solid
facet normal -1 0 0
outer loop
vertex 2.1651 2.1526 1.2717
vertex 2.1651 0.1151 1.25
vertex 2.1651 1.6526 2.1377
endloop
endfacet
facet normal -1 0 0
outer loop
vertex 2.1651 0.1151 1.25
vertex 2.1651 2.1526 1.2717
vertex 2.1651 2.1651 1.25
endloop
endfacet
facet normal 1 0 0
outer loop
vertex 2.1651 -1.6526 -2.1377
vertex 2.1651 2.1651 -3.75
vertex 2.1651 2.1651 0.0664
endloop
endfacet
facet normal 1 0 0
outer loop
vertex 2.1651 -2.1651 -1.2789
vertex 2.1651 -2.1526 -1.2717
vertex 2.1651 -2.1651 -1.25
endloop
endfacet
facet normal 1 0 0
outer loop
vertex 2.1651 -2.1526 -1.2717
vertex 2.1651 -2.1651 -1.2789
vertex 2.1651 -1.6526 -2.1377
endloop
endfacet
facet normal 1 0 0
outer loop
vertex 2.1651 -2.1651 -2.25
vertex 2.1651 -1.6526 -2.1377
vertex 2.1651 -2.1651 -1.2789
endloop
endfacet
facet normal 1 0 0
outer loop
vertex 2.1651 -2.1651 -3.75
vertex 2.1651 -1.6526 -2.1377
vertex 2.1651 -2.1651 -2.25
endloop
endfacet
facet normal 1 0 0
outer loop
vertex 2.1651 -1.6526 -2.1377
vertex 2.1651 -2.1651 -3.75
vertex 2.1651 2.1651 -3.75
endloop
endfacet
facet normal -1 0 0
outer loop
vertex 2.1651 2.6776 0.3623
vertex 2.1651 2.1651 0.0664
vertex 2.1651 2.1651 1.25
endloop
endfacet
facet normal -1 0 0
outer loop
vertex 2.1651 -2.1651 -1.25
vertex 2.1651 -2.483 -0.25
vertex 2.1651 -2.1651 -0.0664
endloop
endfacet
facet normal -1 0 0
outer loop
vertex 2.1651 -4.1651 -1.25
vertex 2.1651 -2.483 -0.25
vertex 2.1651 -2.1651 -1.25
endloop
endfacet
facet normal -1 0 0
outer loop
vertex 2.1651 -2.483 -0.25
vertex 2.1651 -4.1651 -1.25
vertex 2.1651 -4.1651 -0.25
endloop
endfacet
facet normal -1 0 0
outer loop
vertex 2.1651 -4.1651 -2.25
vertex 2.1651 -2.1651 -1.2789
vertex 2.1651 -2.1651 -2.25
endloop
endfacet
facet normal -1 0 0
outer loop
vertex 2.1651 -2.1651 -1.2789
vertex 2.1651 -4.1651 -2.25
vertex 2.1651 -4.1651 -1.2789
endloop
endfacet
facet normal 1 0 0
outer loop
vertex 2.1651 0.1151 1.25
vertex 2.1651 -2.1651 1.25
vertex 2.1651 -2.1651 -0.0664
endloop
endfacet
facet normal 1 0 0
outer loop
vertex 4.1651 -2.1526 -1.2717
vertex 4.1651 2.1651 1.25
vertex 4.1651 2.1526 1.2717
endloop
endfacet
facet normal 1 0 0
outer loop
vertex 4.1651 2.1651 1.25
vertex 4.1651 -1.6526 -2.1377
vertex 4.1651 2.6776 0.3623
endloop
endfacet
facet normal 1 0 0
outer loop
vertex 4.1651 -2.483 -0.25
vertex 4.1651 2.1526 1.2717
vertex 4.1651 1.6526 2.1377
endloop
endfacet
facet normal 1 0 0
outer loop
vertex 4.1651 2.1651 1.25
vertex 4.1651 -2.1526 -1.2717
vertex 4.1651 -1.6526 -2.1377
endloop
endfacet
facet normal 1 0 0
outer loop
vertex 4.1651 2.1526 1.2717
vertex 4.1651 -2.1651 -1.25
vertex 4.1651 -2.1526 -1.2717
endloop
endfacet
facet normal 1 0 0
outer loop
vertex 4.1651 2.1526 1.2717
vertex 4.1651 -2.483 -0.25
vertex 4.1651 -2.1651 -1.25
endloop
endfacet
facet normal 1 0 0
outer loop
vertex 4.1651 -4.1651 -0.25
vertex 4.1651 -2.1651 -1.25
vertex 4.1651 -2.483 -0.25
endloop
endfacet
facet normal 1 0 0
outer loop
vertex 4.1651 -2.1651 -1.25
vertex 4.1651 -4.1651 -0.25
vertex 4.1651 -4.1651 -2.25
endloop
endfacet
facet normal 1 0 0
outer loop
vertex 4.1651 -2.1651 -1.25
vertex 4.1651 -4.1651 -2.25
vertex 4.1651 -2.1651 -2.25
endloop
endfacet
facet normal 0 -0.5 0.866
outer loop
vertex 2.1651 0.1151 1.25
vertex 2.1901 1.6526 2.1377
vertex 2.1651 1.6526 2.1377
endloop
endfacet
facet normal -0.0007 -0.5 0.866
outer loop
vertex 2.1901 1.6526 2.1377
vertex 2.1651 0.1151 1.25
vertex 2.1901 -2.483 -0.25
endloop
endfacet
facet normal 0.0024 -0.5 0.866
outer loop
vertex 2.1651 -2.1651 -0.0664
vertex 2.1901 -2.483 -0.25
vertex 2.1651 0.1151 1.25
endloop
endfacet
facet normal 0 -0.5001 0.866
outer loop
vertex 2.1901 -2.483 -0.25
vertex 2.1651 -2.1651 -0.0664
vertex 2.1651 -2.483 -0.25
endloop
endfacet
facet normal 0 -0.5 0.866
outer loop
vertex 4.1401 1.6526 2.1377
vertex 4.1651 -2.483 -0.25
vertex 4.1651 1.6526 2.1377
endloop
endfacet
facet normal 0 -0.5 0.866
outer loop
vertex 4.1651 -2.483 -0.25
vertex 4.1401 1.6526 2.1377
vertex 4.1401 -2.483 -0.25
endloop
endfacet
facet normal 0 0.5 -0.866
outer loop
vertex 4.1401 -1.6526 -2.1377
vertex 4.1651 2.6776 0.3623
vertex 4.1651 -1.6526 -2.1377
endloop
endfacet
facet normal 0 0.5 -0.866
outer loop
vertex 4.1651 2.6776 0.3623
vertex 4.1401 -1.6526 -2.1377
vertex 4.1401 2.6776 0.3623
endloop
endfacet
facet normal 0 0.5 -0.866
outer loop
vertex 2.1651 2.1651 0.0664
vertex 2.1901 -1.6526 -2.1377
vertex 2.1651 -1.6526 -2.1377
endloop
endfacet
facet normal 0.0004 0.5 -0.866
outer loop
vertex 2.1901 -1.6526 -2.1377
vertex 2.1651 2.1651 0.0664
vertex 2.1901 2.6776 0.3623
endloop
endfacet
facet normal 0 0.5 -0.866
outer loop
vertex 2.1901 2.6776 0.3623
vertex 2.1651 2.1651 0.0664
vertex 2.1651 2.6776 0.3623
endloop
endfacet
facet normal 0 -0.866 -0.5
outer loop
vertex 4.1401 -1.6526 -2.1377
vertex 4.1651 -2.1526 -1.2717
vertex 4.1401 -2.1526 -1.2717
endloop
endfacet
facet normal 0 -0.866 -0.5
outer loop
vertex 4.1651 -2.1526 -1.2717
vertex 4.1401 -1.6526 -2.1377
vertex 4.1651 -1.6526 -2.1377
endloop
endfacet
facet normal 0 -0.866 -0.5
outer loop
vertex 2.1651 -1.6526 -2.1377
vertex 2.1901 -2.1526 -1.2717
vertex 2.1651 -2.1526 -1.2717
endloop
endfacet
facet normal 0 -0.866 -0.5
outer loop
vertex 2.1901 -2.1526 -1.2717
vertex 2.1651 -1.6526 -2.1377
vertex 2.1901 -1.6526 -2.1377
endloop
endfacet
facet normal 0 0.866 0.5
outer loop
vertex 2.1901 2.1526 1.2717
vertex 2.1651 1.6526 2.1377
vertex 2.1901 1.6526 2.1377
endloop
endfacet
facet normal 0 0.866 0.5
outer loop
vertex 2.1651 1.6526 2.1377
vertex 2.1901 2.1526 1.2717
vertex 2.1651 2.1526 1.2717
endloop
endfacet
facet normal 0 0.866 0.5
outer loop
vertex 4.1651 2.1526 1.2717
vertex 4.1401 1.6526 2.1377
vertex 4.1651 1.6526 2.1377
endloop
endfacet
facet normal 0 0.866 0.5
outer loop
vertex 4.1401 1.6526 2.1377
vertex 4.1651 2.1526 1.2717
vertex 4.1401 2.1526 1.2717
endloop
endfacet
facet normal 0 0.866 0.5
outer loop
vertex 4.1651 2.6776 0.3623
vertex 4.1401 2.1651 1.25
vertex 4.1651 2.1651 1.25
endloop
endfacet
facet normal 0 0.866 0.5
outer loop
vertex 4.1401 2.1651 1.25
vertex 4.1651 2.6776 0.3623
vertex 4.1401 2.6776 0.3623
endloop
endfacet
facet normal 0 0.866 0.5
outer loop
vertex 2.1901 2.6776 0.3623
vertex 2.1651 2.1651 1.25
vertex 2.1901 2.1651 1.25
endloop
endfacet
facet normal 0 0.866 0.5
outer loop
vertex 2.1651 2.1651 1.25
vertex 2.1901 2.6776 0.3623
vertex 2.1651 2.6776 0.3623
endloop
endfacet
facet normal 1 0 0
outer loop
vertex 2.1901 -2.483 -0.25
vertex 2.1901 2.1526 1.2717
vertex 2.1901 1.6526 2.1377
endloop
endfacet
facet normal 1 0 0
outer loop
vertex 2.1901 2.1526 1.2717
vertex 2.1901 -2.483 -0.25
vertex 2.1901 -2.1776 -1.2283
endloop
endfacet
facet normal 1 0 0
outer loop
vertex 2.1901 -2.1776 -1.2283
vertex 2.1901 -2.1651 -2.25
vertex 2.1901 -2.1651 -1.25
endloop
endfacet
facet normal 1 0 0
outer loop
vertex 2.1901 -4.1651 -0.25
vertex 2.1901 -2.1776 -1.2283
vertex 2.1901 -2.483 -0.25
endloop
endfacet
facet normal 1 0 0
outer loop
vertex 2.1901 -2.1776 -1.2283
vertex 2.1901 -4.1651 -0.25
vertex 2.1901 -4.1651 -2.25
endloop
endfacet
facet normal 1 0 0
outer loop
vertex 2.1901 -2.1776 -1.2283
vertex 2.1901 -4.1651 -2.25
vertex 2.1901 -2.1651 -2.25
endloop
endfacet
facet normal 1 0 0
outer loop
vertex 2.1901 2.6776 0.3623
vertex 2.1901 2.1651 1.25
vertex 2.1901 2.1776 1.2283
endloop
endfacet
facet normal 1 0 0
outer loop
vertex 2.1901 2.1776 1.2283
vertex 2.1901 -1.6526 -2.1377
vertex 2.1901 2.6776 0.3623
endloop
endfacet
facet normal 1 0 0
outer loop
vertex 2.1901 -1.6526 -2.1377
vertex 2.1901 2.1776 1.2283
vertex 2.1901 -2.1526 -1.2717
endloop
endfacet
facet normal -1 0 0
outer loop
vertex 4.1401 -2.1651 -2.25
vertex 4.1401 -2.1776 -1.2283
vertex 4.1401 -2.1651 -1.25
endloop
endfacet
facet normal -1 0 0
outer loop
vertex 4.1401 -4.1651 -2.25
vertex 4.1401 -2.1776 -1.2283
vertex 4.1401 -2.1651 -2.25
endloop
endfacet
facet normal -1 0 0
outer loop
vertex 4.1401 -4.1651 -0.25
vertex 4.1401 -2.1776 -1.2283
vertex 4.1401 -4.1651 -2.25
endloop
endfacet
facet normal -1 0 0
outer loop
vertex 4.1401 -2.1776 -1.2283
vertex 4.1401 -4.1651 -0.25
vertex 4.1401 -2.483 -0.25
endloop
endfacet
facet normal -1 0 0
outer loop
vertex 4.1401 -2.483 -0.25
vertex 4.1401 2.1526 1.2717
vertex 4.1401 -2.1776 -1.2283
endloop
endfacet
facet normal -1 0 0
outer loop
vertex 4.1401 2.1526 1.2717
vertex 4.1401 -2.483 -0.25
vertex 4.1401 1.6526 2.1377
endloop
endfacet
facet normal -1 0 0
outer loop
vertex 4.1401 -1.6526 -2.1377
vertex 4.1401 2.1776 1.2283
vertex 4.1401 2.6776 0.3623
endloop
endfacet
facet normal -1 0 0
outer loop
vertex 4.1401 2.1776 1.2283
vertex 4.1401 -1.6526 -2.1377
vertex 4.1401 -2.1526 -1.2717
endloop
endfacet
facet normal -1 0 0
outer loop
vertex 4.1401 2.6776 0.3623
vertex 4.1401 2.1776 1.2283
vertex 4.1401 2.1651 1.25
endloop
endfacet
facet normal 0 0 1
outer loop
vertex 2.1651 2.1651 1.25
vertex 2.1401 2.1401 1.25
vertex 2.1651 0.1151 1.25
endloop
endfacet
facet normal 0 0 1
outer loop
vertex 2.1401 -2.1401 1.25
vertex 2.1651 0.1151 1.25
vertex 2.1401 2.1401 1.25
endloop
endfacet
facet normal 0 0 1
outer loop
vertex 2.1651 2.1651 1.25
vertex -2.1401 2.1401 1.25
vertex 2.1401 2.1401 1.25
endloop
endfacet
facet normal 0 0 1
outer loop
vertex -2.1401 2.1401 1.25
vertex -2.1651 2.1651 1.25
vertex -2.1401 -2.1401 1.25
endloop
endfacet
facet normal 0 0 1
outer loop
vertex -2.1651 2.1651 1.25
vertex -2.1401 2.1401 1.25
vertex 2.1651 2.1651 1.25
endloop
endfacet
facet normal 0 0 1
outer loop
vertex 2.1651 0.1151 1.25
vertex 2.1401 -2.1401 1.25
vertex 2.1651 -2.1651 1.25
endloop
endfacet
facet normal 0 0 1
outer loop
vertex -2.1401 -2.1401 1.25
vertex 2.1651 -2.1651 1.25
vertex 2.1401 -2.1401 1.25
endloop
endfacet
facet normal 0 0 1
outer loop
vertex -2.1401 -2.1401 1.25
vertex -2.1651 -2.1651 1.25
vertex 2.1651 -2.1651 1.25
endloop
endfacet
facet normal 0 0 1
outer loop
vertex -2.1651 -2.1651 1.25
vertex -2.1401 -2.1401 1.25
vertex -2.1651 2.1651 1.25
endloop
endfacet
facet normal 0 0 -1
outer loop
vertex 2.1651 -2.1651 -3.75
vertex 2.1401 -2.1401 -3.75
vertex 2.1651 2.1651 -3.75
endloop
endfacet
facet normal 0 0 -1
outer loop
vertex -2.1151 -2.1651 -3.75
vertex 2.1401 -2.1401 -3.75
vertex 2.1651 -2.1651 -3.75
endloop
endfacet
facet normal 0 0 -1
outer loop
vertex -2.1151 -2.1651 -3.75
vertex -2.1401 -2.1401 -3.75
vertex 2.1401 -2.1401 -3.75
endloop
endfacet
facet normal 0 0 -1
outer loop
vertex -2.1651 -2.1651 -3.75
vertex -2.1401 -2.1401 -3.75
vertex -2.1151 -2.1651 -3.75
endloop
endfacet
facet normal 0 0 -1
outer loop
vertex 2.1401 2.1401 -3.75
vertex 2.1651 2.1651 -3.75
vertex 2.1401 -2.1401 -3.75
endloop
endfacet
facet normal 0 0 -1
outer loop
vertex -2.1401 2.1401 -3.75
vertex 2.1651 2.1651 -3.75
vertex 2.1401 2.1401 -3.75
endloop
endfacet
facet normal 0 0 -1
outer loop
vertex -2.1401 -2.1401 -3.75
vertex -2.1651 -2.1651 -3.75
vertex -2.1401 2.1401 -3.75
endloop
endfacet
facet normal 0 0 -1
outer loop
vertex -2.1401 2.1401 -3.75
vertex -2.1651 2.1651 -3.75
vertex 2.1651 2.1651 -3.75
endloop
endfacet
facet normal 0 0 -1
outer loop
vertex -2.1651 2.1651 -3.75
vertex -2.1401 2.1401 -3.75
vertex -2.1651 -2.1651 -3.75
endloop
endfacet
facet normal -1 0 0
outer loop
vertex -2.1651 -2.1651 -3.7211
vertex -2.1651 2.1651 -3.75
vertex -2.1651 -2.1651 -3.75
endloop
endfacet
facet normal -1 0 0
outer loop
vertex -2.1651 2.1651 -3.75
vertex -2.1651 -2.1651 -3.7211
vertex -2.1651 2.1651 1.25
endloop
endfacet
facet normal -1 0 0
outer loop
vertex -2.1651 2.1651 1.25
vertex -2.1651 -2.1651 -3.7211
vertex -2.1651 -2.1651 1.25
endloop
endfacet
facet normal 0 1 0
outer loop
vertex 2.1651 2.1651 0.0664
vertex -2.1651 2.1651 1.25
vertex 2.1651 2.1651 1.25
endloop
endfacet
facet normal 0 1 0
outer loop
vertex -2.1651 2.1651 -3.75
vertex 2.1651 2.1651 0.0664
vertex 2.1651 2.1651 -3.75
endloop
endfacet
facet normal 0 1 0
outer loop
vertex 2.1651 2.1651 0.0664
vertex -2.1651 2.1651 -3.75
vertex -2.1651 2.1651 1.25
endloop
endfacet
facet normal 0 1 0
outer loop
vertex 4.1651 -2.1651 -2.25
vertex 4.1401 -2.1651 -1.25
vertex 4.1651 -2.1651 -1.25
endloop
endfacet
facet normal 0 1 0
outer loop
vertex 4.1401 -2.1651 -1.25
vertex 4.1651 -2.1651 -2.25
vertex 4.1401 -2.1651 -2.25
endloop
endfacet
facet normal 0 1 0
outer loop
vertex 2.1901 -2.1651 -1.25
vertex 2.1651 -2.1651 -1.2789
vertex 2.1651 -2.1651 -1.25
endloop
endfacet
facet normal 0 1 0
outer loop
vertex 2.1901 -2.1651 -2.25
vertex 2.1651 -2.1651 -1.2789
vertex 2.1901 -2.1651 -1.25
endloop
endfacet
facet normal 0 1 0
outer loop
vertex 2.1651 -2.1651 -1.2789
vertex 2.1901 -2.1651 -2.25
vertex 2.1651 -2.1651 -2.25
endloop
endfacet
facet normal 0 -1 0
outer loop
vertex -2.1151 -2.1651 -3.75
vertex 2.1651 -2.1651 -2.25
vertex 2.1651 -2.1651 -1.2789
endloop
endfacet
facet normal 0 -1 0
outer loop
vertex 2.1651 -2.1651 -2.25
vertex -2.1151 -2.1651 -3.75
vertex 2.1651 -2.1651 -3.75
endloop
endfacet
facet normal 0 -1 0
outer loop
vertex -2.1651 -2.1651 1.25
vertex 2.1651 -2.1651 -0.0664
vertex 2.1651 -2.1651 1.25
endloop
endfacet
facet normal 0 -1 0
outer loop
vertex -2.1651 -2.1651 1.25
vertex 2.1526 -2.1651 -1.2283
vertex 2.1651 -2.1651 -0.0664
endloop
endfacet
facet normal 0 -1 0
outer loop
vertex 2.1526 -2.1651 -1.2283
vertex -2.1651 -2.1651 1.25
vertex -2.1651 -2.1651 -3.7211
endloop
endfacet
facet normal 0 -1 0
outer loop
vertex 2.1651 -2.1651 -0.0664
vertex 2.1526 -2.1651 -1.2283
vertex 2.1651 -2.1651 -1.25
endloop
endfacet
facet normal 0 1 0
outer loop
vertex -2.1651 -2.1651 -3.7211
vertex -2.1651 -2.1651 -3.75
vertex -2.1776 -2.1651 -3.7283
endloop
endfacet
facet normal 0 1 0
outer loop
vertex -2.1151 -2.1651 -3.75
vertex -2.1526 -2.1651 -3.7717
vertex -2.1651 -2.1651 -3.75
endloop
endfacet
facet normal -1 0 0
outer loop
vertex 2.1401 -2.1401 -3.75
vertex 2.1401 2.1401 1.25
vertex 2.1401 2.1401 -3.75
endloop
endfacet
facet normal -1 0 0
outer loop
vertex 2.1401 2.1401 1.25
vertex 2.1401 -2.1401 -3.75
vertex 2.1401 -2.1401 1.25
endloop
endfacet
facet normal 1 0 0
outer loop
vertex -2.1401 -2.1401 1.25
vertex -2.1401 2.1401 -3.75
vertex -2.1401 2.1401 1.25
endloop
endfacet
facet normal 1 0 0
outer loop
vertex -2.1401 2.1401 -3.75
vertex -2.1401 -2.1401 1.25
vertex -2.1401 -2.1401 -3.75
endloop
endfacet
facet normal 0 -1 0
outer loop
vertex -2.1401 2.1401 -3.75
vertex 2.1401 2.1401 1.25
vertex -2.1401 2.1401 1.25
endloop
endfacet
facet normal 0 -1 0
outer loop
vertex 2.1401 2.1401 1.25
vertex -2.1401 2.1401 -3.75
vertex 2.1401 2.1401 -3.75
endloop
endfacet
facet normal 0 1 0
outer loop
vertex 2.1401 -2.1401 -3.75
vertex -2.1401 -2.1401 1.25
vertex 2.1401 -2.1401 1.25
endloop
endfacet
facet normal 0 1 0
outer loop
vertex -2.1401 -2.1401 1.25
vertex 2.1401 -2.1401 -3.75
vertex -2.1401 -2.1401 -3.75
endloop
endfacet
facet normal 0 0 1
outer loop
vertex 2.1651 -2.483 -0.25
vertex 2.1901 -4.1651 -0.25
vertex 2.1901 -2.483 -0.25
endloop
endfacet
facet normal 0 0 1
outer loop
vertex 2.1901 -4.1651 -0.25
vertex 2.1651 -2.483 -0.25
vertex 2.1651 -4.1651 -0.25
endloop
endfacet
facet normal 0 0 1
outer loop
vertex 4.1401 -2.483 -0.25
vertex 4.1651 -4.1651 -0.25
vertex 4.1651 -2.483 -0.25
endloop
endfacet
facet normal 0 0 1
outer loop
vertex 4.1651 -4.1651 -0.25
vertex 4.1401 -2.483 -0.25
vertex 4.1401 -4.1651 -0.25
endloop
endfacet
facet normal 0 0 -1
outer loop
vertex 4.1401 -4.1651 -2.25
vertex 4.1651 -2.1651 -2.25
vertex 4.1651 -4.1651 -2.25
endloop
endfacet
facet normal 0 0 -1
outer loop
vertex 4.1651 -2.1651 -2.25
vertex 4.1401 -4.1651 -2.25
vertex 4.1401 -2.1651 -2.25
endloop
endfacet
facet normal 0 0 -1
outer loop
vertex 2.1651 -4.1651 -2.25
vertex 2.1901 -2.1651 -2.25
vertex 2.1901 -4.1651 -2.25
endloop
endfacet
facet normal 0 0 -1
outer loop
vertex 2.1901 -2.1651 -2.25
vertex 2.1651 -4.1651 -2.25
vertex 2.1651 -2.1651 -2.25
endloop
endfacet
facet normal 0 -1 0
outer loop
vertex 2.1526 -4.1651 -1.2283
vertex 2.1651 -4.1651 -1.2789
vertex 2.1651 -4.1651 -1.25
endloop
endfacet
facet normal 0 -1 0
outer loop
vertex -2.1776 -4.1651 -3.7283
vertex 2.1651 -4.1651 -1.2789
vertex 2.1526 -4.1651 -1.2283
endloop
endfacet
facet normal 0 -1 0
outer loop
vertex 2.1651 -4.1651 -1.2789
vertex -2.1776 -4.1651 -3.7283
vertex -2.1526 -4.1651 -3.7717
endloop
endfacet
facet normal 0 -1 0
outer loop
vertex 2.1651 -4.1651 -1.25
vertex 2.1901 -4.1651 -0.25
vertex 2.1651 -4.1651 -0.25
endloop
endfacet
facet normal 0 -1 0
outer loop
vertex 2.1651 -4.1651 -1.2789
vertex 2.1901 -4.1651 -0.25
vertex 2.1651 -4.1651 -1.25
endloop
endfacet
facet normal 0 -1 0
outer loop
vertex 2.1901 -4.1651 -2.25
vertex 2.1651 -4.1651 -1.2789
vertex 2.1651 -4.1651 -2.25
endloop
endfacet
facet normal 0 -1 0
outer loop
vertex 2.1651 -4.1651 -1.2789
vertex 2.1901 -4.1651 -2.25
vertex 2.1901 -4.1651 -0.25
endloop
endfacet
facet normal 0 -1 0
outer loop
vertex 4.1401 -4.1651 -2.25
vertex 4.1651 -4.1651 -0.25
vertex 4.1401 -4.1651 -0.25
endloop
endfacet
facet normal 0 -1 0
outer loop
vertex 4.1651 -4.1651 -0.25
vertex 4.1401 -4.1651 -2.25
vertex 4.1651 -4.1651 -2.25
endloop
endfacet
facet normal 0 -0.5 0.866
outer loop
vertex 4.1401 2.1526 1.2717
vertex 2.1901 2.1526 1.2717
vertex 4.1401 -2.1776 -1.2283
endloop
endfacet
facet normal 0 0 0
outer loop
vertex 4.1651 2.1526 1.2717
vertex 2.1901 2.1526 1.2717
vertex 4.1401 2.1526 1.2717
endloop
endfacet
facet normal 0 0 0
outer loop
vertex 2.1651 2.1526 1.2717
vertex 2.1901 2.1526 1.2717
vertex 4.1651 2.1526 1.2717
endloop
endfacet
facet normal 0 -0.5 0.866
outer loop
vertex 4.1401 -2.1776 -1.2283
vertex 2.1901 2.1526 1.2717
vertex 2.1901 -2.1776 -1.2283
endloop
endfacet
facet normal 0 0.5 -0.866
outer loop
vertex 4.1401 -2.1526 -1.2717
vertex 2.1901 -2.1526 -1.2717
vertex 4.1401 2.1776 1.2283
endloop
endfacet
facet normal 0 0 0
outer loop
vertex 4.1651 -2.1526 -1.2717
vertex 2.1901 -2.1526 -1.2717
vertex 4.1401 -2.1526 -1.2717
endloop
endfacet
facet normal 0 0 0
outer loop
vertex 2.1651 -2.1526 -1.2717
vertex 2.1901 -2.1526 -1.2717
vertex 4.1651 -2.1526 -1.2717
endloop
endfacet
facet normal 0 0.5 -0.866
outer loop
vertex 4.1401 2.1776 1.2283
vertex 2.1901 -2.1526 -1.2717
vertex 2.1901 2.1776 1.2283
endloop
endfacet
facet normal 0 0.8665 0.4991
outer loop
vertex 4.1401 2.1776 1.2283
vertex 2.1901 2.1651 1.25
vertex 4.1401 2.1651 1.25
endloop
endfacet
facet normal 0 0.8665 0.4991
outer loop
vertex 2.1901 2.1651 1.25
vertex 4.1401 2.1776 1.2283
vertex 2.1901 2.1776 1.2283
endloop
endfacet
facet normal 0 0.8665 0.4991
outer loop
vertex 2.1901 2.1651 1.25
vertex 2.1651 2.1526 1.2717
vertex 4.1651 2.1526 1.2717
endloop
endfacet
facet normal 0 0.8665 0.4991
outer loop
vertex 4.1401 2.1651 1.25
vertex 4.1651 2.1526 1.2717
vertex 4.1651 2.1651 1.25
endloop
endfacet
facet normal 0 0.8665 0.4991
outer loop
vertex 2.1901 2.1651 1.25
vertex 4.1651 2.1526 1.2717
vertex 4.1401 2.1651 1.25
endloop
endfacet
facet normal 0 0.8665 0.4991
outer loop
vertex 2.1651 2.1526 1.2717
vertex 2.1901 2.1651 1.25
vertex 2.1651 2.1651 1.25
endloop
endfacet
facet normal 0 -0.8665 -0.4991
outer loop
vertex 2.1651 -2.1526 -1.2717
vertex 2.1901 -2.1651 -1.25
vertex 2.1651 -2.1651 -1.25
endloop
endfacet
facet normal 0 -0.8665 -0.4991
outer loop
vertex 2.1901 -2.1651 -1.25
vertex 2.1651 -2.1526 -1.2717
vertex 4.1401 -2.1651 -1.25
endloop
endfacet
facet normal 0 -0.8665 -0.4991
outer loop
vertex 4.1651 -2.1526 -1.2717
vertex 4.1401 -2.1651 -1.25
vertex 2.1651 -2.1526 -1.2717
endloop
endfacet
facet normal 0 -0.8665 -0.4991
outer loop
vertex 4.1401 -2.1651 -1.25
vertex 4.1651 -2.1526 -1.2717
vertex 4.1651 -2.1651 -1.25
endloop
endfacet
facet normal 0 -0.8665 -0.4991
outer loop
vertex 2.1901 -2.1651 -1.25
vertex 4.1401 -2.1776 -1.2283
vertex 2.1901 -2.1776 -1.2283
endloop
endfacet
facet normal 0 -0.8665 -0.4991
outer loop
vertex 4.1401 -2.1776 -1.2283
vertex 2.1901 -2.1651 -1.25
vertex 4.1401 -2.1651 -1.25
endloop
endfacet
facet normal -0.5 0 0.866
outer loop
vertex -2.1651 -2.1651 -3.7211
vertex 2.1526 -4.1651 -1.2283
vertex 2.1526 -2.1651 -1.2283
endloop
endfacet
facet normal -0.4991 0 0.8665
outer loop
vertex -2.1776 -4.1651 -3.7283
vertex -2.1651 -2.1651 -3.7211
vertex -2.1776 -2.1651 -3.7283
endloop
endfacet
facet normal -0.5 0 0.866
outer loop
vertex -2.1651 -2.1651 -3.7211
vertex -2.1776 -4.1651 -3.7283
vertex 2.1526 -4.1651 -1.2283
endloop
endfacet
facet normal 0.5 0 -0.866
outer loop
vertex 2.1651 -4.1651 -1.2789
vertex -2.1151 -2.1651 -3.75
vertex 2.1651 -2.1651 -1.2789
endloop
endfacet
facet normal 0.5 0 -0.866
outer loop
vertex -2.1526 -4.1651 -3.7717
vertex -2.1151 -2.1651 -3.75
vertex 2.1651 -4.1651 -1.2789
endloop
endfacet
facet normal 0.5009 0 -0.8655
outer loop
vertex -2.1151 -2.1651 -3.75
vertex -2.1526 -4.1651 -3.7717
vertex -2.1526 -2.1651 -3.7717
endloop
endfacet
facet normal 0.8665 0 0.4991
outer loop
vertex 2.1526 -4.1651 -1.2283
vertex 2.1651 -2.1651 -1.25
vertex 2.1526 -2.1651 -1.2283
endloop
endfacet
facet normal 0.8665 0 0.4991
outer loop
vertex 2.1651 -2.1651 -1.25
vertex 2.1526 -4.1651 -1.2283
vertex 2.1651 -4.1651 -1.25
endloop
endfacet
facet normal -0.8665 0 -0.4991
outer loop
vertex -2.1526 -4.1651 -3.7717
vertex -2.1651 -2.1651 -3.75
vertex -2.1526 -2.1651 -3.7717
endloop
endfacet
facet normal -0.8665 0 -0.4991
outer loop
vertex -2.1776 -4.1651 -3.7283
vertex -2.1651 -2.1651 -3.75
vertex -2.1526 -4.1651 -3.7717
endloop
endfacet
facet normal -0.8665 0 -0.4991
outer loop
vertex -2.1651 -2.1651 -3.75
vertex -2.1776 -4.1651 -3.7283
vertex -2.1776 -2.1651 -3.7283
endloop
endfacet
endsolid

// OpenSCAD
module cube_diversity(width, length, height){
    cube(size = [width, length, height], center = true);
}
//Example: translate([0,0,10]) cube_eli(3,9,1);

module cylinder_diversity(h, r1, r2, $fn){
    center = true;
    cylinder(size = [h,r1,r2,$fn]);
}
//Example: cylinder_eli(10, 10, 10, 30);

module sphere_diversity(r, $fa, $fn){
    center = true;
    sphere(size = [r,$fa,$fn]);
} 
//Example: sphere_eli(r, $fa, $fn);

//first ramp
difference(){
   translate([1+2.5*cos(30),0,0]) rotate([30,0,0]) cube_diversity(2,5,2.05);
   translate([1+2.5*cos(30),0,0]) rotate([30,0,0]) cube_diversity(1.95,5,3);
}
translate([1+2.5*cos(30),0,0]) rotate([30,0,0]) cube_diversity(2,5,0.05);


//middle
difference(){
translate([0,0,-1.25])cube_diversity(5*cos(30),5*cos(30),5);
translate([0,0,-1.25])cube_diversity(5*cos(30)-0.05,5*cos(30)-0.05,5);
}

//second ramp
translate([0,-(1+2.5*cos(30)),-2.5]) rotate([330,0,90]) cube_diversity(2,5,0.05);
//flat piece
difference(){
    translate([1+2.5*cos(30),-(1+2.5*cos(30)),-1.25]) cube_diversity(2,2,2);
    translate([1+2.5*cos(30),-(1+2.5*cos(30)),-1.25]) cube_diversity(1.95,2,2);
}
    
